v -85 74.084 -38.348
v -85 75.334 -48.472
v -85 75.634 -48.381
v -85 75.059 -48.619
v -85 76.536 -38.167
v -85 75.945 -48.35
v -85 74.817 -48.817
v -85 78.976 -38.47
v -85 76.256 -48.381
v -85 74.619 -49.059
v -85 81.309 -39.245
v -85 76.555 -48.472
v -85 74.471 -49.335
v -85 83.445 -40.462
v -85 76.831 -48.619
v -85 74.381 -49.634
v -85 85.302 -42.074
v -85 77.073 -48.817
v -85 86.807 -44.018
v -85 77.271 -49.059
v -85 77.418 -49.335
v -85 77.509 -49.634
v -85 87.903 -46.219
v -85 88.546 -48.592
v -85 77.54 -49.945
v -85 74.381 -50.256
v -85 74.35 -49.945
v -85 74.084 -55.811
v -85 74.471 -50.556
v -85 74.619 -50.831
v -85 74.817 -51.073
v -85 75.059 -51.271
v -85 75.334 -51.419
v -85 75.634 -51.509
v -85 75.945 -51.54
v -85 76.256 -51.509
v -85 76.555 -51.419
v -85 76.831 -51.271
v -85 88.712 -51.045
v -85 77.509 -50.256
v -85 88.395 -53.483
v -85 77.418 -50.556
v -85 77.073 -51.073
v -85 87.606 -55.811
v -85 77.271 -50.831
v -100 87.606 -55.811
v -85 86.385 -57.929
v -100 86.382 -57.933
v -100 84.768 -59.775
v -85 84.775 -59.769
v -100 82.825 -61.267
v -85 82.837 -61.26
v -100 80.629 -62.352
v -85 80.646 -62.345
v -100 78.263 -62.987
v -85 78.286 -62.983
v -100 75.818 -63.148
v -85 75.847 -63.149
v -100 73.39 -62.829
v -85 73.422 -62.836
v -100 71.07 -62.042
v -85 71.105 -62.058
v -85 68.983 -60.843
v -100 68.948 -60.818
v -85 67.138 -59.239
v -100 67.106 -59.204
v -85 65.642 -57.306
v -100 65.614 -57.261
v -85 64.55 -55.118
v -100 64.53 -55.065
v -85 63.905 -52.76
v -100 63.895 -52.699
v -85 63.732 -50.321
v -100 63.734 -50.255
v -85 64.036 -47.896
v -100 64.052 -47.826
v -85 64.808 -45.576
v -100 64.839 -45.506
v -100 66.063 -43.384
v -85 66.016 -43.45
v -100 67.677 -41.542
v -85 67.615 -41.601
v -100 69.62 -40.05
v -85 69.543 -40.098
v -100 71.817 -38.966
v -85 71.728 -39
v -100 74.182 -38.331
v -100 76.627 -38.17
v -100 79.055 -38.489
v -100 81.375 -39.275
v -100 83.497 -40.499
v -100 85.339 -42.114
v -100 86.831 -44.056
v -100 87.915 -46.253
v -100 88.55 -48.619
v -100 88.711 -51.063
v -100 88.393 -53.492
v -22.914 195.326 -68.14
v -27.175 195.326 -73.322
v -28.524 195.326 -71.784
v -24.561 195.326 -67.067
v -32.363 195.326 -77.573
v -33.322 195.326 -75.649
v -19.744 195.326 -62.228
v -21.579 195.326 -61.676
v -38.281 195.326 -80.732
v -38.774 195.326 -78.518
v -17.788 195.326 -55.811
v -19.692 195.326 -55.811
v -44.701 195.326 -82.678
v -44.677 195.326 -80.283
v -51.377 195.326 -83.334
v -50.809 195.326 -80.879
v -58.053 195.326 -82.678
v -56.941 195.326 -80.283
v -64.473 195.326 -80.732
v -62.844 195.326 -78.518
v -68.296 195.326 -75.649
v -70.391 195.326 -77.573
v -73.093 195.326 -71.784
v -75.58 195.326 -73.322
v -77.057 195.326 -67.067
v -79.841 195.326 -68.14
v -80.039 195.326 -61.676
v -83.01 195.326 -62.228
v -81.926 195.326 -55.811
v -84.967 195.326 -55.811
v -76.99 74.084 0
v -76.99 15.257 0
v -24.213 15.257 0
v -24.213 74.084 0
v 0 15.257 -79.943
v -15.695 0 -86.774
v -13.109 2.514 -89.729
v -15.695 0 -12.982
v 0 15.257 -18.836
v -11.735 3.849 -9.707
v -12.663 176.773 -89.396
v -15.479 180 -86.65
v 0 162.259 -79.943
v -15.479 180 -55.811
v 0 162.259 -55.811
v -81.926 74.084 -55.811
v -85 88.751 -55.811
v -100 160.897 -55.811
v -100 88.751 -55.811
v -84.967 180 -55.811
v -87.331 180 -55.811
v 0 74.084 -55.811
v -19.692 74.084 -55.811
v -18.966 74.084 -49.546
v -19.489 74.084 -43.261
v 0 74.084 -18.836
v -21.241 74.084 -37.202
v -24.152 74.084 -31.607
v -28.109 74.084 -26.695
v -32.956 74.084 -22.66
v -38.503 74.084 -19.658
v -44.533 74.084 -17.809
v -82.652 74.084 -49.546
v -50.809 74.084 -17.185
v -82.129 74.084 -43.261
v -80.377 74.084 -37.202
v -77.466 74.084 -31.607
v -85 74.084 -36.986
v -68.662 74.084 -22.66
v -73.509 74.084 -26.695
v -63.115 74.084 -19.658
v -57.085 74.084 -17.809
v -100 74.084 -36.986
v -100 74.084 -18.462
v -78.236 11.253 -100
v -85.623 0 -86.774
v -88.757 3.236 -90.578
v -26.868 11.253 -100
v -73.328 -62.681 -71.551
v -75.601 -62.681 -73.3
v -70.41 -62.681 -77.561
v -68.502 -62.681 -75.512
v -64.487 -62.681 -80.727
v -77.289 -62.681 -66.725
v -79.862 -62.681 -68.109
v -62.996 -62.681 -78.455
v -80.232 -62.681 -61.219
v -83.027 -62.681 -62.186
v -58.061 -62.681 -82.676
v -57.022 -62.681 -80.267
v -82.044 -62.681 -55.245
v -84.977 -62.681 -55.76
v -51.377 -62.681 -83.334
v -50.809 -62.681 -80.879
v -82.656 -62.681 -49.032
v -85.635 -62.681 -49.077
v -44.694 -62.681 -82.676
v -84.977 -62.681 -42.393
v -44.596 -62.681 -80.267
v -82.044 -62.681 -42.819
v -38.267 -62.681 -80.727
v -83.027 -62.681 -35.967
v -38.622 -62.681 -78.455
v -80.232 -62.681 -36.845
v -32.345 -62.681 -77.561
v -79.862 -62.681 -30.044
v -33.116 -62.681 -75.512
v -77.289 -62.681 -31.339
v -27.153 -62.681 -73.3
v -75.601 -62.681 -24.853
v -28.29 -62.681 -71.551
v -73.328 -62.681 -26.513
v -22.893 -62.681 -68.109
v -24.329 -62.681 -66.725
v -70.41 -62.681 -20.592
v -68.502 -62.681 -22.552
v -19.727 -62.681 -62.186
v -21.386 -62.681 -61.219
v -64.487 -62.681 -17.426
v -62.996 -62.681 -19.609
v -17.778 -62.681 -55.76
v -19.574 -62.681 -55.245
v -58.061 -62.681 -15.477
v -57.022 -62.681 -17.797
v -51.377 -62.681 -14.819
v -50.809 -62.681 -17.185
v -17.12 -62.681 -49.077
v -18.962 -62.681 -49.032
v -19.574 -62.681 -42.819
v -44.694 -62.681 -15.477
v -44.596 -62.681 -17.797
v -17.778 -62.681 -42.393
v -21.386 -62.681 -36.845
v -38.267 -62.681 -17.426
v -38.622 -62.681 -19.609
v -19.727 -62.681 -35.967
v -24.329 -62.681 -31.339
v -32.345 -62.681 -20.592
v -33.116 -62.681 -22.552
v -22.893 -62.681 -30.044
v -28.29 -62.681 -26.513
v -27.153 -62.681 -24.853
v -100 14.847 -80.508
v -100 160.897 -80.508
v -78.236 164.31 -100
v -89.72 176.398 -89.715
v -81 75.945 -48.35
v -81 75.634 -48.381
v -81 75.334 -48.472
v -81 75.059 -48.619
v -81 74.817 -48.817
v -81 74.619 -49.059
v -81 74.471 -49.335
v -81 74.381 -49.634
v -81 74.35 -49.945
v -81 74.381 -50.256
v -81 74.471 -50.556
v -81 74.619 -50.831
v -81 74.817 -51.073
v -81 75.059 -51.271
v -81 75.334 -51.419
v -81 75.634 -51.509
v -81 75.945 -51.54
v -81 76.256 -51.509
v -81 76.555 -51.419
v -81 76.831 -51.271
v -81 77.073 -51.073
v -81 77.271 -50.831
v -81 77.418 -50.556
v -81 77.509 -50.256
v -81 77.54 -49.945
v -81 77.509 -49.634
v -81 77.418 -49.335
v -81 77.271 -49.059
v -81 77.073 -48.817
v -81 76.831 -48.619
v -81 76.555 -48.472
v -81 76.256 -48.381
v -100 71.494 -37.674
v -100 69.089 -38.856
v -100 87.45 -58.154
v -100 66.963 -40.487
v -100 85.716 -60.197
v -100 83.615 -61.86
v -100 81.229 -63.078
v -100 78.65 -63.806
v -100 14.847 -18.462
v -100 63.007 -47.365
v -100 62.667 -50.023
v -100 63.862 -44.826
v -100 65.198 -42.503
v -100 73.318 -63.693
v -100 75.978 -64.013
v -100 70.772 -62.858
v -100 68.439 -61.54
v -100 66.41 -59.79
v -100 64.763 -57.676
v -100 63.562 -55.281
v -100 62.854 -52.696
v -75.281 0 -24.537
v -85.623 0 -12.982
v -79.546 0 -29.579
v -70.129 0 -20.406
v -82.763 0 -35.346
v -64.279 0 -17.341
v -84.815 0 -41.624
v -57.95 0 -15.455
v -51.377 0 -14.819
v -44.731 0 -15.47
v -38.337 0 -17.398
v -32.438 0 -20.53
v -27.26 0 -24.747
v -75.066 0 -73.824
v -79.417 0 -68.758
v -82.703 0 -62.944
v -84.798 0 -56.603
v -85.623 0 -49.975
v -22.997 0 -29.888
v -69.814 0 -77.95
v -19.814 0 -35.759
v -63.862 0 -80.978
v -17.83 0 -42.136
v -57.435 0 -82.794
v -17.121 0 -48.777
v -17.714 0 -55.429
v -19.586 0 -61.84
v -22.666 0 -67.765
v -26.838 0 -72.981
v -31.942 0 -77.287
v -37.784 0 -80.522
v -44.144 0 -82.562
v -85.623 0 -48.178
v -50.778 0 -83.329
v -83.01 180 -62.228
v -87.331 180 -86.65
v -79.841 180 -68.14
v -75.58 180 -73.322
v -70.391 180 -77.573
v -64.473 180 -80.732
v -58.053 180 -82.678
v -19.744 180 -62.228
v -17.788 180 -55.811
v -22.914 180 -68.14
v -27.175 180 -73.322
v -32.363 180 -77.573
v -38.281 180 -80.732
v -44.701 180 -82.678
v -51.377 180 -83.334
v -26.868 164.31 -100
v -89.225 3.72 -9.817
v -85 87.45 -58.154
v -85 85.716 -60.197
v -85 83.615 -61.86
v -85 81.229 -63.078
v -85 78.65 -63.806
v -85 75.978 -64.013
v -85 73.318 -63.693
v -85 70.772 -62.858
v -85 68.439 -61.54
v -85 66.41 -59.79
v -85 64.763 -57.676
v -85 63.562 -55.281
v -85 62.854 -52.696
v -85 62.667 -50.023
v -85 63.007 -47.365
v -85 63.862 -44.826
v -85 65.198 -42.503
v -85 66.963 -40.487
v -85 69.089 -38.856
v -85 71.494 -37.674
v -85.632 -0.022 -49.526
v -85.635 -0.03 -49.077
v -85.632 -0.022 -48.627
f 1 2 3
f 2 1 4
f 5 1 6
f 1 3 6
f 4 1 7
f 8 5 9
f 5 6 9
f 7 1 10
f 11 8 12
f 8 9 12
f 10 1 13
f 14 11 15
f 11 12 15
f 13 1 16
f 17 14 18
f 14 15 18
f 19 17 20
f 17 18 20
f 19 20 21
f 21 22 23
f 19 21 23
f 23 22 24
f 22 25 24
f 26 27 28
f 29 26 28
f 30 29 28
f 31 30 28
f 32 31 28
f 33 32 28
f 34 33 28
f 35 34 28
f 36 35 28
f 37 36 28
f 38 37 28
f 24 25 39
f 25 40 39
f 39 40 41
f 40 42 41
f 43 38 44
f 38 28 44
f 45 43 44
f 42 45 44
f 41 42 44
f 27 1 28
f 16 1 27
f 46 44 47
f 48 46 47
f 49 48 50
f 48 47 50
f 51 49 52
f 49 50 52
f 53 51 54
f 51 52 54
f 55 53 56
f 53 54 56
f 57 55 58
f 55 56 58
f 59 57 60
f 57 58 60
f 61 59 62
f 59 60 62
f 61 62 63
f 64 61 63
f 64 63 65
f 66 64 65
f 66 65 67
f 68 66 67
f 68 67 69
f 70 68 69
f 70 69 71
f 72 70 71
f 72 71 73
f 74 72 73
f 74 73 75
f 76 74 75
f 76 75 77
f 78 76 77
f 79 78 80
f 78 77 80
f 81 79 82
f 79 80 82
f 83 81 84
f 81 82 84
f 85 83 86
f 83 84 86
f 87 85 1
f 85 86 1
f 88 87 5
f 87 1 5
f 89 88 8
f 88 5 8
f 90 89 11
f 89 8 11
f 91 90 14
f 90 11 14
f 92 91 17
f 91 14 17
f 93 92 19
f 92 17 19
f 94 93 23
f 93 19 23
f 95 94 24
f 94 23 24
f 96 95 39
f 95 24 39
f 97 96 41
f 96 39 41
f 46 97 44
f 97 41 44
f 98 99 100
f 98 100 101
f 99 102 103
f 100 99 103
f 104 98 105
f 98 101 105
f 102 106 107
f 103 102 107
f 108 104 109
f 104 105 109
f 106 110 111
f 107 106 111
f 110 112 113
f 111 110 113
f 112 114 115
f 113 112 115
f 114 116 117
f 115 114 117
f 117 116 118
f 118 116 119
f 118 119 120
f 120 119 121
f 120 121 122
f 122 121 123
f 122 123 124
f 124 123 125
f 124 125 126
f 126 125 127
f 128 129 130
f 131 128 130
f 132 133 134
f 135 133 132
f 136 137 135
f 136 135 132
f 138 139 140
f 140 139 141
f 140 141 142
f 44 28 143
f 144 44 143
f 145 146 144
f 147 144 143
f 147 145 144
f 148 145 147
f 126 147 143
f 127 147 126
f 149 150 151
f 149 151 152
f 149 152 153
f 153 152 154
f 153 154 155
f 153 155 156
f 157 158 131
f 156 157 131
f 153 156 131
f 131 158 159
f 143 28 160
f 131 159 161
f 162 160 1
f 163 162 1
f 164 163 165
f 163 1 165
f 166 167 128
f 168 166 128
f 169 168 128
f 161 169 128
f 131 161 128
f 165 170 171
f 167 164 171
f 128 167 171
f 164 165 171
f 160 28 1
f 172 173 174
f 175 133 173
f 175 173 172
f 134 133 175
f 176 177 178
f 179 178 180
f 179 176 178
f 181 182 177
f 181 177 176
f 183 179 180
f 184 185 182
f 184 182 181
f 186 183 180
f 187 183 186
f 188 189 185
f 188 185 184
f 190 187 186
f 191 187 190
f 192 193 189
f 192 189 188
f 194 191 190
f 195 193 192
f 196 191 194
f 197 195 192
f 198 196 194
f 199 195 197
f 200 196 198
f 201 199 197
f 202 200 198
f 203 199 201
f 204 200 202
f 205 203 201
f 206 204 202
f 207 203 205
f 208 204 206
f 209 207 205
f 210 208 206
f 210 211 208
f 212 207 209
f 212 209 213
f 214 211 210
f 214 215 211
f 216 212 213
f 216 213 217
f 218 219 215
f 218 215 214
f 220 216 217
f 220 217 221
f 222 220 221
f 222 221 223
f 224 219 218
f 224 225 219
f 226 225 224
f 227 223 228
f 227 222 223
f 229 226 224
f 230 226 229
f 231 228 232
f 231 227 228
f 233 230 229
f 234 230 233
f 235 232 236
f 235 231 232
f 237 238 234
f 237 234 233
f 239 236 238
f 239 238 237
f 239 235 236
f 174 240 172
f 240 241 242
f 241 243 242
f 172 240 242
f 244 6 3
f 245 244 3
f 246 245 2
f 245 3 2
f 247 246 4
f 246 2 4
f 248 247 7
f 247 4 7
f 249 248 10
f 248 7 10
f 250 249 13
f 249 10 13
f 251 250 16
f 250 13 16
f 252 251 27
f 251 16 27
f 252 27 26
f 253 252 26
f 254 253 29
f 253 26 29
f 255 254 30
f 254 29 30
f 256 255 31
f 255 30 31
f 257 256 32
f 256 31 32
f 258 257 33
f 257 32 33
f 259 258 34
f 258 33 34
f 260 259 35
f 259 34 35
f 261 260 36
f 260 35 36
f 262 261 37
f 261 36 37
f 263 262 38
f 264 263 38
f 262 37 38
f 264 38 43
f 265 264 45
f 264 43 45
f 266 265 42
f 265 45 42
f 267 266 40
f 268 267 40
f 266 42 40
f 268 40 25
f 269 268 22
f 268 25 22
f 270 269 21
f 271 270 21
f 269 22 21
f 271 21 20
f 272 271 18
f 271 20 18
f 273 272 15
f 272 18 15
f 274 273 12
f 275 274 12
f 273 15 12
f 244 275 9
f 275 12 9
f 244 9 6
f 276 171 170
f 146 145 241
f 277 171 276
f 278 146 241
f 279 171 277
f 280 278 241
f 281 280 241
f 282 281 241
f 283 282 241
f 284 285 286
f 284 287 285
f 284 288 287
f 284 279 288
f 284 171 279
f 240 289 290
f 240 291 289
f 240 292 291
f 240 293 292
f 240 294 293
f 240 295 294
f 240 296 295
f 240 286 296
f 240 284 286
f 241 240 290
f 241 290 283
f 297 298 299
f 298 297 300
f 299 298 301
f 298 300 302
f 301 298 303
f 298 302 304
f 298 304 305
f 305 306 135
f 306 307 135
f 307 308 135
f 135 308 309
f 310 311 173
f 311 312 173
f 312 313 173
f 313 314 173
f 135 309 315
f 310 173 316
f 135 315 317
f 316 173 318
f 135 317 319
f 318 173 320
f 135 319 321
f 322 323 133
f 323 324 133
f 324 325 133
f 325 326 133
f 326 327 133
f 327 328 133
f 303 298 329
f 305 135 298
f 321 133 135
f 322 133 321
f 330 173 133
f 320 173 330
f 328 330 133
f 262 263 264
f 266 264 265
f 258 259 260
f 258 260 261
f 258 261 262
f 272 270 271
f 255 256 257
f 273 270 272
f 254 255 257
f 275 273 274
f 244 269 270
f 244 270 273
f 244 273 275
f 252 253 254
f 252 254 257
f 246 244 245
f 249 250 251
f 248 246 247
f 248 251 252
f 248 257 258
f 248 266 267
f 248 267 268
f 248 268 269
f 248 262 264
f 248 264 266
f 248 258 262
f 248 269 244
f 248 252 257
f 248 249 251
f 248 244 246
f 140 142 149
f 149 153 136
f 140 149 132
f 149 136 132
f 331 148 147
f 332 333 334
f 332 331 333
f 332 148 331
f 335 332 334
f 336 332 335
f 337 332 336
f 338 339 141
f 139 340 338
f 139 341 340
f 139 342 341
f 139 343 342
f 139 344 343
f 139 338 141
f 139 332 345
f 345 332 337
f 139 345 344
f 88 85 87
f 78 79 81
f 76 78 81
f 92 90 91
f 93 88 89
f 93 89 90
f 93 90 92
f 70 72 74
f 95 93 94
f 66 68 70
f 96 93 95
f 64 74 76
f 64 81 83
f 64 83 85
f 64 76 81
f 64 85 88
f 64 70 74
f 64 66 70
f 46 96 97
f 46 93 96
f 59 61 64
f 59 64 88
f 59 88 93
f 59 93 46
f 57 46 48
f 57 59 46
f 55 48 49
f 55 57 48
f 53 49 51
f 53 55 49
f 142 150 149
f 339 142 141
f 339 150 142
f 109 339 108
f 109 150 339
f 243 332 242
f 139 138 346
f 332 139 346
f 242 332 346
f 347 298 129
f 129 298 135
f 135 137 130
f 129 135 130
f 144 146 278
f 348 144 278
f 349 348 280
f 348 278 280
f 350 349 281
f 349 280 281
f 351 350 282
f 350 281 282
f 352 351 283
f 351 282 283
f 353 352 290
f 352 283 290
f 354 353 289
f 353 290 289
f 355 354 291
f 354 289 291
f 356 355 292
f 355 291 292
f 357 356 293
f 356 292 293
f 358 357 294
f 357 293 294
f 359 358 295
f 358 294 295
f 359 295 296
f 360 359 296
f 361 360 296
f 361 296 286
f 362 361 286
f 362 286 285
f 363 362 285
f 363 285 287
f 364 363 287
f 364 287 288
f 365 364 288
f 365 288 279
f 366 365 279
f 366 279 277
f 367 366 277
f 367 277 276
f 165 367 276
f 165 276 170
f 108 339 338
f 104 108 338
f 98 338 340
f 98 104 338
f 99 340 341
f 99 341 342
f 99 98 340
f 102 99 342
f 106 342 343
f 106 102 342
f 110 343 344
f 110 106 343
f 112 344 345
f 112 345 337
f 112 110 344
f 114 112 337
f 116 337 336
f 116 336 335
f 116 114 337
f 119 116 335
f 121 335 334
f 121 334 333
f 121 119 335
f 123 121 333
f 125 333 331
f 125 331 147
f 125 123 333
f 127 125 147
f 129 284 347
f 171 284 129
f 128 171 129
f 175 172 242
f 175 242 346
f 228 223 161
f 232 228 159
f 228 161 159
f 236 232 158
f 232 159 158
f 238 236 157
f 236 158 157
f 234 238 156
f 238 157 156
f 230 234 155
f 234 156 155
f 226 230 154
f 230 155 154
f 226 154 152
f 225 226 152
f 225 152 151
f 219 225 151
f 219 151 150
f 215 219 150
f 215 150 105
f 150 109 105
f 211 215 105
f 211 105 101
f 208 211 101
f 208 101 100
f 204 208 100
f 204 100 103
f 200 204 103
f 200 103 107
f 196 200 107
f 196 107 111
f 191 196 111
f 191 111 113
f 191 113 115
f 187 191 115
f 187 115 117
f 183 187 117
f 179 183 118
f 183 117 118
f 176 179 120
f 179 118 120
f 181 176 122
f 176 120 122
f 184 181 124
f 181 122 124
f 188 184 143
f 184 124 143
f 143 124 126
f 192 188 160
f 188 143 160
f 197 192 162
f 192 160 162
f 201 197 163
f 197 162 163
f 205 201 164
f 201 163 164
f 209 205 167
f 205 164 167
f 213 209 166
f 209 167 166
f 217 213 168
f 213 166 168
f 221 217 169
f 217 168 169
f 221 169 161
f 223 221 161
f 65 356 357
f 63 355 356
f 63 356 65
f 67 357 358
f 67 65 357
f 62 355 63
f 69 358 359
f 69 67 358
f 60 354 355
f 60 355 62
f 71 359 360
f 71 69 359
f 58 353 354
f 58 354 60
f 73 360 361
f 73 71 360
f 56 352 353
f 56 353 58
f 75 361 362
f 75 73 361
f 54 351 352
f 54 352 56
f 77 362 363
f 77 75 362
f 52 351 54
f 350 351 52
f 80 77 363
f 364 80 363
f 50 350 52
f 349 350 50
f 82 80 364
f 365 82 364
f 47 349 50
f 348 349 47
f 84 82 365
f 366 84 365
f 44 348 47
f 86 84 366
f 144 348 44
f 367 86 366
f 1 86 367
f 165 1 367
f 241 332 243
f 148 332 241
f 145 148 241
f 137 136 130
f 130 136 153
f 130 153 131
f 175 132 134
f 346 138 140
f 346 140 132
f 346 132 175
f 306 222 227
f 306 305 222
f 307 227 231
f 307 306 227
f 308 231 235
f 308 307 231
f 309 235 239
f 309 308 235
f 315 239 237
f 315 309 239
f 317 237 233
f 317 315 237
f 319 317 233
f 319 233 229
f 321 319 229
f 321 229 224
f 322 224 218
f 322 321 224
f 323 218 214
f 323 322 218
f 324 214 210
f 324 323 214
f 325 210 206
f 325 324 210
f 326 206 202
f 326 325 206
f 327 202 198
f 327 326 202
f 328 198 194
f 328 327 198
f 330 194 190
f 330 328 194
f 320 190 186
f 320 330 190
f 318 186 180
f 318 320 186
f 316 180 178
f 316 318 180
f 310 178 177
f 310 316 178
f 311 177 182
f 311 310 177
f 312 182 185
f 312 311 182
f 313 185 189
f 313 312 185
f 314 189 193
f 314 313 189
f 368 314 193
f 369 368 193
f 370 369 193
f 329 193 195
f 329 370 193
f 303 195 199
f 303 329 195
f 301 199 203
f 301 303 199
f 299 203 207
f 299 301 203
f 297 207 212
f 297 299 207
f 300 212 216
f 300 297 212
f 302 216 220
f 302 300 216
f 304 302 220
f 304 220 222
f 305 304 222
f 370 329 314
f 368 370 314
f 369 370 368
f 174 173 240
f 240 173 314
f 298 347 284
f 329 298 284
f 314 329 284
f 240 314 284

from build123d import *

# Parameters (mm, degrees)
SKETCH1_W           = 100
SKETCH1_H           = 100
BOSS_EXTRUDE1_DEPTH = 180
SKETCH2_R           = 34.257790197
BOSS_EXTRUDE2_DEPTH = 350
SKETCH3_W           = 152.006357392
SKETCH3_H           = 282.452416457
CUT_EXTRUDE2_DEPTH  = 400
CUT_EXTRUDE3_DEPTH  = 400
CUT_EXTRUDE4_DEPTH  = 400
CUT_EXTRUDE5_DEPTH  = 400
SKETCH7_W           = 160.159381639
SKETCH7_H           = 147.362276113
CUT_EXTRUDE6_DEPTH  = 400
SKETCH8_W           = 147.310744502
SKETCH8_H           = 162.038906966
CUT_EXTRUDE7_DEPTH  = 400
SKETCH9_R           = 31.847293423
CUT_EXTRUDE8_DEPTH  = 400
SKETCH10_W          = 140.220962397
SKETCH10_H          = 212.033531124
CUT_EXTRUDE9_DEPTH  = 400
SKETCH11_R          = 13.603137886
CUT_EXTRUDE11_DEPTH = 15
SKETCH12_R          = 12.495422516
BOSS_EXTRUDE3_DEPTH = 15
SKETCH13_R          = 1.594865099
BOSS_EXTRUDE4_DEPTH = 4
SKETCH14_W          = 100.74862993
SKETCH14_H          = 110.555003588
CUT_EXTRUDE13_DEPTH = 400


with BuildPart() as part:
    # Sketch1 → Boss-Extrude1 (new body)
    with BuildSketch(Plane(origin=(0, 0, 0), x_dir=(1, 0, 0), z_dir=(0, 1, 0))):
        with Locations((-50, 50)):
            Rectangle(SKETCH1_W, SKETCH1_H)
    extrude(amount=BOSS_EXTRUDE1_DEPTH)

    # Sketch2 → Boss-Extrude2 (add, symmetric)
    with BuildSketch(Plane(origin=(0, 180, 0), x_dir=(1, 0, 0), z_dir=(0, 1, 0))):
        with Locations(Location((-51.377291833, 49.076536384, 0), (0, 0, 270))):
            Circle(SKETCH2_R)
    extrude(amount=BOSS_EXTRUDE2_DEPTH, both=True)

    # Sketch3 → Cut-Extrude2 (cut)
    with BuildSketch(Plane(origin=(0, 0, 0), x_dir=(0, 0, -1), z_dir=(1, 0, 0))):
        with Locations((57.419900112, 502.274302507)):
            Rectangle(SKETCH3_W, SKETCH3_H)
    extrude(amount=-CUT_EXTRUDE2_DEPTH, mode=Mode.SUBTRACT)

    # Sketch4 → Cut-Extrude3 (cut)
    with BuildSketch(Plane(origin=(0, 0, 0), x_dir=(0, 0, -1), z_dir=(1, 0, 0))):
        Polygon((12.981970869, 0), (-8.994244796, 25.828096003), (-18.564506014, -15.259465835), align=None)
        Polygon((85.072517936, -1.448103984), (109.237639161, 19.113145112), (115.920034239, -3.267382694), align=None)
        Polygon((12.981970869, 180), (-8.994244796, 148.537596011), (-15.418178585, 193.219274892), align=None)
        Polygon((85.072517936, 181.854312784), (103.841225373, 159.795920888), (106.132549481, 198.647393934), align=None)
    extrude(amount=-CUT_EXTRUDE3_DEPTH, mode=Mode.SUBTRACT)

    # Sketch5 → Cut-Extrude4 (cut)
    with BuildSketch(Plane.XY):
        Polygon((-85.623287335, 0), (-106.370377984, 21.426392531), (-122.288861874, 3.209259887), (-93.526345261, -19.884701759), align=None)
        Polygon((-15.694988751, 0), (0, 15.257385304), (12.122677088, 15.257385304), (10.563067769, -19.884701759), align=None)
        Polygon((-87.166490339, 180.248071029), (-106.370377984, 151.29108453), (-117.705469457, 200.501115102), align=None)
        Polygon((-15.694988751, 180.248071029), (7.833767065, 153.279557508), (0, 193.941208308), align=None)
    extrude(amount=-CUT_EXTRUDE4_DEPTH, mode=Mode.SUBTRACT)

    # Sketch6 → Cut-Extrude5 (cut)
    with BuildSketch(Plane(origin=(0, 180, 0), x_dir=(1, 0, 0), z_dir=(0, 1, 0))):
        Polygon((-112.386997555, 28.400400964), (-64.261264503, -10.212759359), (-84.406366528, -15.51192827), (-124.649689542, -15.51192827), align=None)
        Polygon((-97.065537028, 135.861756084), (-119.37552445, 77.792688888), (-118.043343626, 64.347606737), (-66.428694172, 110.575168787), align=None)
        Polygon((-24.69640689, -21.815840769), (11.092108798, -8.97361337), (17.428316417, 32.393768119), (-38.531576846, -11.139157378), align=None)
        Polygon((-17.445484601, 140.804394854), (35.417473102, 107.262520599), (9.305452855, 72.996438725), (-31.724385352, 103.625272537), align=None)
    extrude(amount=-CUT_EXTRUDE5_DEPTH, mode=Mode.SUBTRACT)

    # Sketch7 → Cut-Extrude6 (cut)
    with BuildSketch(Plane.XY):
        with Locations((-66.123258915, -136.36252694)):
            Rectangle(SKETCH7_W, SKETCH7_H)
    extrude(amount=-CUT_EXTRUDE6_DEPTH, mode=Mode.SUBTRACT)

    # Sketch8 → Cut-Extrude7 (cut)
    with BuildSketch(Plane.XY):
        with Locations((-53.541153336, 332.448287589)):
            Rectangle(SKETCH8_W, SKETCH8_H)
    extrude(amount=-CUT_EXTRUDE7_DEPTH, mode=Mode.SUBTRACT)

    # Sketch9 → Cut-Extrude8 (cut)
    with BuildSketch(Plane(origin=(0, 251.428834106, 0), x_dir=(1, 0, 0), z_dir=(0, 1, 0))):
        with Locations(Location((-50.808993157, 49.032036374, 0), (0, 0, 270))):
            Circle(SKETCH9_R)
    extrude(amount=-CUT_EXTRUDE8_DEPTH, mode=Mode.SUBTRACT)

    # Sketch10 → Cut-Extrude9 (cut)
    with BuildSketch(Plane.ZY.offset(100)):
        with Locations((14.299084536, 180.100625535)):
            Rectangle(SKETCH10_W, SKETCH10_H)
    extrude(amount=-CUT_EXTRUDE9_DEPTH, mode=Mode.SUBTRACT)

    # Sketch11 → Cut-Extrude11 (cut)
    with BuildSketch(Plane.ZY.offset(100)):
        with Locations((-50.413251954, 76.264646142)):
            Circle(SKETCH11_R)
    extrude(amount=-CUT_EXTRUDE11_DEPTH, mode=Mode.SUBTRACT)

    # Sketch12 → Boss-Extrude3 (add)
    with BuildSketch(Plane.ZY.offset(85)):
        with Locations(Location((-50.658800768, 76.222522328, 0), (0, 0, 114.353089558))):
            Circle(SKETCH12_R)
    extrude(amount=BOSS_EXTRUDE3_DEPTH)

    # Sketch13 → Boss-Extrude4 (add)
    with BuildSketch(Plane(origin=(-85, 0, 0), x_dir=(0, 0, -1), z_dir=(1, 0, 0))):
        with Locations(Location((49.945205578, 75.944780088, 0), (0, 0, 180))):
            Circle(SKETCH13_R)
    extrude(amount=BOSS_EXTRUDE4_DEPTH)

    # Sketch14 → Cut-Extrude13 (cut)
    with BuildSketch(Plane.ZY.offset(100)):
        with Locations((-65.350029467, 250.603414818)):
            Rectangle(SKETCH14_W, SKETCH14_H)
    extrude(amount=-CUT_EXTRUDE13_DEPTH, mode=Mode.SUBTRACT)


solid = part.part
